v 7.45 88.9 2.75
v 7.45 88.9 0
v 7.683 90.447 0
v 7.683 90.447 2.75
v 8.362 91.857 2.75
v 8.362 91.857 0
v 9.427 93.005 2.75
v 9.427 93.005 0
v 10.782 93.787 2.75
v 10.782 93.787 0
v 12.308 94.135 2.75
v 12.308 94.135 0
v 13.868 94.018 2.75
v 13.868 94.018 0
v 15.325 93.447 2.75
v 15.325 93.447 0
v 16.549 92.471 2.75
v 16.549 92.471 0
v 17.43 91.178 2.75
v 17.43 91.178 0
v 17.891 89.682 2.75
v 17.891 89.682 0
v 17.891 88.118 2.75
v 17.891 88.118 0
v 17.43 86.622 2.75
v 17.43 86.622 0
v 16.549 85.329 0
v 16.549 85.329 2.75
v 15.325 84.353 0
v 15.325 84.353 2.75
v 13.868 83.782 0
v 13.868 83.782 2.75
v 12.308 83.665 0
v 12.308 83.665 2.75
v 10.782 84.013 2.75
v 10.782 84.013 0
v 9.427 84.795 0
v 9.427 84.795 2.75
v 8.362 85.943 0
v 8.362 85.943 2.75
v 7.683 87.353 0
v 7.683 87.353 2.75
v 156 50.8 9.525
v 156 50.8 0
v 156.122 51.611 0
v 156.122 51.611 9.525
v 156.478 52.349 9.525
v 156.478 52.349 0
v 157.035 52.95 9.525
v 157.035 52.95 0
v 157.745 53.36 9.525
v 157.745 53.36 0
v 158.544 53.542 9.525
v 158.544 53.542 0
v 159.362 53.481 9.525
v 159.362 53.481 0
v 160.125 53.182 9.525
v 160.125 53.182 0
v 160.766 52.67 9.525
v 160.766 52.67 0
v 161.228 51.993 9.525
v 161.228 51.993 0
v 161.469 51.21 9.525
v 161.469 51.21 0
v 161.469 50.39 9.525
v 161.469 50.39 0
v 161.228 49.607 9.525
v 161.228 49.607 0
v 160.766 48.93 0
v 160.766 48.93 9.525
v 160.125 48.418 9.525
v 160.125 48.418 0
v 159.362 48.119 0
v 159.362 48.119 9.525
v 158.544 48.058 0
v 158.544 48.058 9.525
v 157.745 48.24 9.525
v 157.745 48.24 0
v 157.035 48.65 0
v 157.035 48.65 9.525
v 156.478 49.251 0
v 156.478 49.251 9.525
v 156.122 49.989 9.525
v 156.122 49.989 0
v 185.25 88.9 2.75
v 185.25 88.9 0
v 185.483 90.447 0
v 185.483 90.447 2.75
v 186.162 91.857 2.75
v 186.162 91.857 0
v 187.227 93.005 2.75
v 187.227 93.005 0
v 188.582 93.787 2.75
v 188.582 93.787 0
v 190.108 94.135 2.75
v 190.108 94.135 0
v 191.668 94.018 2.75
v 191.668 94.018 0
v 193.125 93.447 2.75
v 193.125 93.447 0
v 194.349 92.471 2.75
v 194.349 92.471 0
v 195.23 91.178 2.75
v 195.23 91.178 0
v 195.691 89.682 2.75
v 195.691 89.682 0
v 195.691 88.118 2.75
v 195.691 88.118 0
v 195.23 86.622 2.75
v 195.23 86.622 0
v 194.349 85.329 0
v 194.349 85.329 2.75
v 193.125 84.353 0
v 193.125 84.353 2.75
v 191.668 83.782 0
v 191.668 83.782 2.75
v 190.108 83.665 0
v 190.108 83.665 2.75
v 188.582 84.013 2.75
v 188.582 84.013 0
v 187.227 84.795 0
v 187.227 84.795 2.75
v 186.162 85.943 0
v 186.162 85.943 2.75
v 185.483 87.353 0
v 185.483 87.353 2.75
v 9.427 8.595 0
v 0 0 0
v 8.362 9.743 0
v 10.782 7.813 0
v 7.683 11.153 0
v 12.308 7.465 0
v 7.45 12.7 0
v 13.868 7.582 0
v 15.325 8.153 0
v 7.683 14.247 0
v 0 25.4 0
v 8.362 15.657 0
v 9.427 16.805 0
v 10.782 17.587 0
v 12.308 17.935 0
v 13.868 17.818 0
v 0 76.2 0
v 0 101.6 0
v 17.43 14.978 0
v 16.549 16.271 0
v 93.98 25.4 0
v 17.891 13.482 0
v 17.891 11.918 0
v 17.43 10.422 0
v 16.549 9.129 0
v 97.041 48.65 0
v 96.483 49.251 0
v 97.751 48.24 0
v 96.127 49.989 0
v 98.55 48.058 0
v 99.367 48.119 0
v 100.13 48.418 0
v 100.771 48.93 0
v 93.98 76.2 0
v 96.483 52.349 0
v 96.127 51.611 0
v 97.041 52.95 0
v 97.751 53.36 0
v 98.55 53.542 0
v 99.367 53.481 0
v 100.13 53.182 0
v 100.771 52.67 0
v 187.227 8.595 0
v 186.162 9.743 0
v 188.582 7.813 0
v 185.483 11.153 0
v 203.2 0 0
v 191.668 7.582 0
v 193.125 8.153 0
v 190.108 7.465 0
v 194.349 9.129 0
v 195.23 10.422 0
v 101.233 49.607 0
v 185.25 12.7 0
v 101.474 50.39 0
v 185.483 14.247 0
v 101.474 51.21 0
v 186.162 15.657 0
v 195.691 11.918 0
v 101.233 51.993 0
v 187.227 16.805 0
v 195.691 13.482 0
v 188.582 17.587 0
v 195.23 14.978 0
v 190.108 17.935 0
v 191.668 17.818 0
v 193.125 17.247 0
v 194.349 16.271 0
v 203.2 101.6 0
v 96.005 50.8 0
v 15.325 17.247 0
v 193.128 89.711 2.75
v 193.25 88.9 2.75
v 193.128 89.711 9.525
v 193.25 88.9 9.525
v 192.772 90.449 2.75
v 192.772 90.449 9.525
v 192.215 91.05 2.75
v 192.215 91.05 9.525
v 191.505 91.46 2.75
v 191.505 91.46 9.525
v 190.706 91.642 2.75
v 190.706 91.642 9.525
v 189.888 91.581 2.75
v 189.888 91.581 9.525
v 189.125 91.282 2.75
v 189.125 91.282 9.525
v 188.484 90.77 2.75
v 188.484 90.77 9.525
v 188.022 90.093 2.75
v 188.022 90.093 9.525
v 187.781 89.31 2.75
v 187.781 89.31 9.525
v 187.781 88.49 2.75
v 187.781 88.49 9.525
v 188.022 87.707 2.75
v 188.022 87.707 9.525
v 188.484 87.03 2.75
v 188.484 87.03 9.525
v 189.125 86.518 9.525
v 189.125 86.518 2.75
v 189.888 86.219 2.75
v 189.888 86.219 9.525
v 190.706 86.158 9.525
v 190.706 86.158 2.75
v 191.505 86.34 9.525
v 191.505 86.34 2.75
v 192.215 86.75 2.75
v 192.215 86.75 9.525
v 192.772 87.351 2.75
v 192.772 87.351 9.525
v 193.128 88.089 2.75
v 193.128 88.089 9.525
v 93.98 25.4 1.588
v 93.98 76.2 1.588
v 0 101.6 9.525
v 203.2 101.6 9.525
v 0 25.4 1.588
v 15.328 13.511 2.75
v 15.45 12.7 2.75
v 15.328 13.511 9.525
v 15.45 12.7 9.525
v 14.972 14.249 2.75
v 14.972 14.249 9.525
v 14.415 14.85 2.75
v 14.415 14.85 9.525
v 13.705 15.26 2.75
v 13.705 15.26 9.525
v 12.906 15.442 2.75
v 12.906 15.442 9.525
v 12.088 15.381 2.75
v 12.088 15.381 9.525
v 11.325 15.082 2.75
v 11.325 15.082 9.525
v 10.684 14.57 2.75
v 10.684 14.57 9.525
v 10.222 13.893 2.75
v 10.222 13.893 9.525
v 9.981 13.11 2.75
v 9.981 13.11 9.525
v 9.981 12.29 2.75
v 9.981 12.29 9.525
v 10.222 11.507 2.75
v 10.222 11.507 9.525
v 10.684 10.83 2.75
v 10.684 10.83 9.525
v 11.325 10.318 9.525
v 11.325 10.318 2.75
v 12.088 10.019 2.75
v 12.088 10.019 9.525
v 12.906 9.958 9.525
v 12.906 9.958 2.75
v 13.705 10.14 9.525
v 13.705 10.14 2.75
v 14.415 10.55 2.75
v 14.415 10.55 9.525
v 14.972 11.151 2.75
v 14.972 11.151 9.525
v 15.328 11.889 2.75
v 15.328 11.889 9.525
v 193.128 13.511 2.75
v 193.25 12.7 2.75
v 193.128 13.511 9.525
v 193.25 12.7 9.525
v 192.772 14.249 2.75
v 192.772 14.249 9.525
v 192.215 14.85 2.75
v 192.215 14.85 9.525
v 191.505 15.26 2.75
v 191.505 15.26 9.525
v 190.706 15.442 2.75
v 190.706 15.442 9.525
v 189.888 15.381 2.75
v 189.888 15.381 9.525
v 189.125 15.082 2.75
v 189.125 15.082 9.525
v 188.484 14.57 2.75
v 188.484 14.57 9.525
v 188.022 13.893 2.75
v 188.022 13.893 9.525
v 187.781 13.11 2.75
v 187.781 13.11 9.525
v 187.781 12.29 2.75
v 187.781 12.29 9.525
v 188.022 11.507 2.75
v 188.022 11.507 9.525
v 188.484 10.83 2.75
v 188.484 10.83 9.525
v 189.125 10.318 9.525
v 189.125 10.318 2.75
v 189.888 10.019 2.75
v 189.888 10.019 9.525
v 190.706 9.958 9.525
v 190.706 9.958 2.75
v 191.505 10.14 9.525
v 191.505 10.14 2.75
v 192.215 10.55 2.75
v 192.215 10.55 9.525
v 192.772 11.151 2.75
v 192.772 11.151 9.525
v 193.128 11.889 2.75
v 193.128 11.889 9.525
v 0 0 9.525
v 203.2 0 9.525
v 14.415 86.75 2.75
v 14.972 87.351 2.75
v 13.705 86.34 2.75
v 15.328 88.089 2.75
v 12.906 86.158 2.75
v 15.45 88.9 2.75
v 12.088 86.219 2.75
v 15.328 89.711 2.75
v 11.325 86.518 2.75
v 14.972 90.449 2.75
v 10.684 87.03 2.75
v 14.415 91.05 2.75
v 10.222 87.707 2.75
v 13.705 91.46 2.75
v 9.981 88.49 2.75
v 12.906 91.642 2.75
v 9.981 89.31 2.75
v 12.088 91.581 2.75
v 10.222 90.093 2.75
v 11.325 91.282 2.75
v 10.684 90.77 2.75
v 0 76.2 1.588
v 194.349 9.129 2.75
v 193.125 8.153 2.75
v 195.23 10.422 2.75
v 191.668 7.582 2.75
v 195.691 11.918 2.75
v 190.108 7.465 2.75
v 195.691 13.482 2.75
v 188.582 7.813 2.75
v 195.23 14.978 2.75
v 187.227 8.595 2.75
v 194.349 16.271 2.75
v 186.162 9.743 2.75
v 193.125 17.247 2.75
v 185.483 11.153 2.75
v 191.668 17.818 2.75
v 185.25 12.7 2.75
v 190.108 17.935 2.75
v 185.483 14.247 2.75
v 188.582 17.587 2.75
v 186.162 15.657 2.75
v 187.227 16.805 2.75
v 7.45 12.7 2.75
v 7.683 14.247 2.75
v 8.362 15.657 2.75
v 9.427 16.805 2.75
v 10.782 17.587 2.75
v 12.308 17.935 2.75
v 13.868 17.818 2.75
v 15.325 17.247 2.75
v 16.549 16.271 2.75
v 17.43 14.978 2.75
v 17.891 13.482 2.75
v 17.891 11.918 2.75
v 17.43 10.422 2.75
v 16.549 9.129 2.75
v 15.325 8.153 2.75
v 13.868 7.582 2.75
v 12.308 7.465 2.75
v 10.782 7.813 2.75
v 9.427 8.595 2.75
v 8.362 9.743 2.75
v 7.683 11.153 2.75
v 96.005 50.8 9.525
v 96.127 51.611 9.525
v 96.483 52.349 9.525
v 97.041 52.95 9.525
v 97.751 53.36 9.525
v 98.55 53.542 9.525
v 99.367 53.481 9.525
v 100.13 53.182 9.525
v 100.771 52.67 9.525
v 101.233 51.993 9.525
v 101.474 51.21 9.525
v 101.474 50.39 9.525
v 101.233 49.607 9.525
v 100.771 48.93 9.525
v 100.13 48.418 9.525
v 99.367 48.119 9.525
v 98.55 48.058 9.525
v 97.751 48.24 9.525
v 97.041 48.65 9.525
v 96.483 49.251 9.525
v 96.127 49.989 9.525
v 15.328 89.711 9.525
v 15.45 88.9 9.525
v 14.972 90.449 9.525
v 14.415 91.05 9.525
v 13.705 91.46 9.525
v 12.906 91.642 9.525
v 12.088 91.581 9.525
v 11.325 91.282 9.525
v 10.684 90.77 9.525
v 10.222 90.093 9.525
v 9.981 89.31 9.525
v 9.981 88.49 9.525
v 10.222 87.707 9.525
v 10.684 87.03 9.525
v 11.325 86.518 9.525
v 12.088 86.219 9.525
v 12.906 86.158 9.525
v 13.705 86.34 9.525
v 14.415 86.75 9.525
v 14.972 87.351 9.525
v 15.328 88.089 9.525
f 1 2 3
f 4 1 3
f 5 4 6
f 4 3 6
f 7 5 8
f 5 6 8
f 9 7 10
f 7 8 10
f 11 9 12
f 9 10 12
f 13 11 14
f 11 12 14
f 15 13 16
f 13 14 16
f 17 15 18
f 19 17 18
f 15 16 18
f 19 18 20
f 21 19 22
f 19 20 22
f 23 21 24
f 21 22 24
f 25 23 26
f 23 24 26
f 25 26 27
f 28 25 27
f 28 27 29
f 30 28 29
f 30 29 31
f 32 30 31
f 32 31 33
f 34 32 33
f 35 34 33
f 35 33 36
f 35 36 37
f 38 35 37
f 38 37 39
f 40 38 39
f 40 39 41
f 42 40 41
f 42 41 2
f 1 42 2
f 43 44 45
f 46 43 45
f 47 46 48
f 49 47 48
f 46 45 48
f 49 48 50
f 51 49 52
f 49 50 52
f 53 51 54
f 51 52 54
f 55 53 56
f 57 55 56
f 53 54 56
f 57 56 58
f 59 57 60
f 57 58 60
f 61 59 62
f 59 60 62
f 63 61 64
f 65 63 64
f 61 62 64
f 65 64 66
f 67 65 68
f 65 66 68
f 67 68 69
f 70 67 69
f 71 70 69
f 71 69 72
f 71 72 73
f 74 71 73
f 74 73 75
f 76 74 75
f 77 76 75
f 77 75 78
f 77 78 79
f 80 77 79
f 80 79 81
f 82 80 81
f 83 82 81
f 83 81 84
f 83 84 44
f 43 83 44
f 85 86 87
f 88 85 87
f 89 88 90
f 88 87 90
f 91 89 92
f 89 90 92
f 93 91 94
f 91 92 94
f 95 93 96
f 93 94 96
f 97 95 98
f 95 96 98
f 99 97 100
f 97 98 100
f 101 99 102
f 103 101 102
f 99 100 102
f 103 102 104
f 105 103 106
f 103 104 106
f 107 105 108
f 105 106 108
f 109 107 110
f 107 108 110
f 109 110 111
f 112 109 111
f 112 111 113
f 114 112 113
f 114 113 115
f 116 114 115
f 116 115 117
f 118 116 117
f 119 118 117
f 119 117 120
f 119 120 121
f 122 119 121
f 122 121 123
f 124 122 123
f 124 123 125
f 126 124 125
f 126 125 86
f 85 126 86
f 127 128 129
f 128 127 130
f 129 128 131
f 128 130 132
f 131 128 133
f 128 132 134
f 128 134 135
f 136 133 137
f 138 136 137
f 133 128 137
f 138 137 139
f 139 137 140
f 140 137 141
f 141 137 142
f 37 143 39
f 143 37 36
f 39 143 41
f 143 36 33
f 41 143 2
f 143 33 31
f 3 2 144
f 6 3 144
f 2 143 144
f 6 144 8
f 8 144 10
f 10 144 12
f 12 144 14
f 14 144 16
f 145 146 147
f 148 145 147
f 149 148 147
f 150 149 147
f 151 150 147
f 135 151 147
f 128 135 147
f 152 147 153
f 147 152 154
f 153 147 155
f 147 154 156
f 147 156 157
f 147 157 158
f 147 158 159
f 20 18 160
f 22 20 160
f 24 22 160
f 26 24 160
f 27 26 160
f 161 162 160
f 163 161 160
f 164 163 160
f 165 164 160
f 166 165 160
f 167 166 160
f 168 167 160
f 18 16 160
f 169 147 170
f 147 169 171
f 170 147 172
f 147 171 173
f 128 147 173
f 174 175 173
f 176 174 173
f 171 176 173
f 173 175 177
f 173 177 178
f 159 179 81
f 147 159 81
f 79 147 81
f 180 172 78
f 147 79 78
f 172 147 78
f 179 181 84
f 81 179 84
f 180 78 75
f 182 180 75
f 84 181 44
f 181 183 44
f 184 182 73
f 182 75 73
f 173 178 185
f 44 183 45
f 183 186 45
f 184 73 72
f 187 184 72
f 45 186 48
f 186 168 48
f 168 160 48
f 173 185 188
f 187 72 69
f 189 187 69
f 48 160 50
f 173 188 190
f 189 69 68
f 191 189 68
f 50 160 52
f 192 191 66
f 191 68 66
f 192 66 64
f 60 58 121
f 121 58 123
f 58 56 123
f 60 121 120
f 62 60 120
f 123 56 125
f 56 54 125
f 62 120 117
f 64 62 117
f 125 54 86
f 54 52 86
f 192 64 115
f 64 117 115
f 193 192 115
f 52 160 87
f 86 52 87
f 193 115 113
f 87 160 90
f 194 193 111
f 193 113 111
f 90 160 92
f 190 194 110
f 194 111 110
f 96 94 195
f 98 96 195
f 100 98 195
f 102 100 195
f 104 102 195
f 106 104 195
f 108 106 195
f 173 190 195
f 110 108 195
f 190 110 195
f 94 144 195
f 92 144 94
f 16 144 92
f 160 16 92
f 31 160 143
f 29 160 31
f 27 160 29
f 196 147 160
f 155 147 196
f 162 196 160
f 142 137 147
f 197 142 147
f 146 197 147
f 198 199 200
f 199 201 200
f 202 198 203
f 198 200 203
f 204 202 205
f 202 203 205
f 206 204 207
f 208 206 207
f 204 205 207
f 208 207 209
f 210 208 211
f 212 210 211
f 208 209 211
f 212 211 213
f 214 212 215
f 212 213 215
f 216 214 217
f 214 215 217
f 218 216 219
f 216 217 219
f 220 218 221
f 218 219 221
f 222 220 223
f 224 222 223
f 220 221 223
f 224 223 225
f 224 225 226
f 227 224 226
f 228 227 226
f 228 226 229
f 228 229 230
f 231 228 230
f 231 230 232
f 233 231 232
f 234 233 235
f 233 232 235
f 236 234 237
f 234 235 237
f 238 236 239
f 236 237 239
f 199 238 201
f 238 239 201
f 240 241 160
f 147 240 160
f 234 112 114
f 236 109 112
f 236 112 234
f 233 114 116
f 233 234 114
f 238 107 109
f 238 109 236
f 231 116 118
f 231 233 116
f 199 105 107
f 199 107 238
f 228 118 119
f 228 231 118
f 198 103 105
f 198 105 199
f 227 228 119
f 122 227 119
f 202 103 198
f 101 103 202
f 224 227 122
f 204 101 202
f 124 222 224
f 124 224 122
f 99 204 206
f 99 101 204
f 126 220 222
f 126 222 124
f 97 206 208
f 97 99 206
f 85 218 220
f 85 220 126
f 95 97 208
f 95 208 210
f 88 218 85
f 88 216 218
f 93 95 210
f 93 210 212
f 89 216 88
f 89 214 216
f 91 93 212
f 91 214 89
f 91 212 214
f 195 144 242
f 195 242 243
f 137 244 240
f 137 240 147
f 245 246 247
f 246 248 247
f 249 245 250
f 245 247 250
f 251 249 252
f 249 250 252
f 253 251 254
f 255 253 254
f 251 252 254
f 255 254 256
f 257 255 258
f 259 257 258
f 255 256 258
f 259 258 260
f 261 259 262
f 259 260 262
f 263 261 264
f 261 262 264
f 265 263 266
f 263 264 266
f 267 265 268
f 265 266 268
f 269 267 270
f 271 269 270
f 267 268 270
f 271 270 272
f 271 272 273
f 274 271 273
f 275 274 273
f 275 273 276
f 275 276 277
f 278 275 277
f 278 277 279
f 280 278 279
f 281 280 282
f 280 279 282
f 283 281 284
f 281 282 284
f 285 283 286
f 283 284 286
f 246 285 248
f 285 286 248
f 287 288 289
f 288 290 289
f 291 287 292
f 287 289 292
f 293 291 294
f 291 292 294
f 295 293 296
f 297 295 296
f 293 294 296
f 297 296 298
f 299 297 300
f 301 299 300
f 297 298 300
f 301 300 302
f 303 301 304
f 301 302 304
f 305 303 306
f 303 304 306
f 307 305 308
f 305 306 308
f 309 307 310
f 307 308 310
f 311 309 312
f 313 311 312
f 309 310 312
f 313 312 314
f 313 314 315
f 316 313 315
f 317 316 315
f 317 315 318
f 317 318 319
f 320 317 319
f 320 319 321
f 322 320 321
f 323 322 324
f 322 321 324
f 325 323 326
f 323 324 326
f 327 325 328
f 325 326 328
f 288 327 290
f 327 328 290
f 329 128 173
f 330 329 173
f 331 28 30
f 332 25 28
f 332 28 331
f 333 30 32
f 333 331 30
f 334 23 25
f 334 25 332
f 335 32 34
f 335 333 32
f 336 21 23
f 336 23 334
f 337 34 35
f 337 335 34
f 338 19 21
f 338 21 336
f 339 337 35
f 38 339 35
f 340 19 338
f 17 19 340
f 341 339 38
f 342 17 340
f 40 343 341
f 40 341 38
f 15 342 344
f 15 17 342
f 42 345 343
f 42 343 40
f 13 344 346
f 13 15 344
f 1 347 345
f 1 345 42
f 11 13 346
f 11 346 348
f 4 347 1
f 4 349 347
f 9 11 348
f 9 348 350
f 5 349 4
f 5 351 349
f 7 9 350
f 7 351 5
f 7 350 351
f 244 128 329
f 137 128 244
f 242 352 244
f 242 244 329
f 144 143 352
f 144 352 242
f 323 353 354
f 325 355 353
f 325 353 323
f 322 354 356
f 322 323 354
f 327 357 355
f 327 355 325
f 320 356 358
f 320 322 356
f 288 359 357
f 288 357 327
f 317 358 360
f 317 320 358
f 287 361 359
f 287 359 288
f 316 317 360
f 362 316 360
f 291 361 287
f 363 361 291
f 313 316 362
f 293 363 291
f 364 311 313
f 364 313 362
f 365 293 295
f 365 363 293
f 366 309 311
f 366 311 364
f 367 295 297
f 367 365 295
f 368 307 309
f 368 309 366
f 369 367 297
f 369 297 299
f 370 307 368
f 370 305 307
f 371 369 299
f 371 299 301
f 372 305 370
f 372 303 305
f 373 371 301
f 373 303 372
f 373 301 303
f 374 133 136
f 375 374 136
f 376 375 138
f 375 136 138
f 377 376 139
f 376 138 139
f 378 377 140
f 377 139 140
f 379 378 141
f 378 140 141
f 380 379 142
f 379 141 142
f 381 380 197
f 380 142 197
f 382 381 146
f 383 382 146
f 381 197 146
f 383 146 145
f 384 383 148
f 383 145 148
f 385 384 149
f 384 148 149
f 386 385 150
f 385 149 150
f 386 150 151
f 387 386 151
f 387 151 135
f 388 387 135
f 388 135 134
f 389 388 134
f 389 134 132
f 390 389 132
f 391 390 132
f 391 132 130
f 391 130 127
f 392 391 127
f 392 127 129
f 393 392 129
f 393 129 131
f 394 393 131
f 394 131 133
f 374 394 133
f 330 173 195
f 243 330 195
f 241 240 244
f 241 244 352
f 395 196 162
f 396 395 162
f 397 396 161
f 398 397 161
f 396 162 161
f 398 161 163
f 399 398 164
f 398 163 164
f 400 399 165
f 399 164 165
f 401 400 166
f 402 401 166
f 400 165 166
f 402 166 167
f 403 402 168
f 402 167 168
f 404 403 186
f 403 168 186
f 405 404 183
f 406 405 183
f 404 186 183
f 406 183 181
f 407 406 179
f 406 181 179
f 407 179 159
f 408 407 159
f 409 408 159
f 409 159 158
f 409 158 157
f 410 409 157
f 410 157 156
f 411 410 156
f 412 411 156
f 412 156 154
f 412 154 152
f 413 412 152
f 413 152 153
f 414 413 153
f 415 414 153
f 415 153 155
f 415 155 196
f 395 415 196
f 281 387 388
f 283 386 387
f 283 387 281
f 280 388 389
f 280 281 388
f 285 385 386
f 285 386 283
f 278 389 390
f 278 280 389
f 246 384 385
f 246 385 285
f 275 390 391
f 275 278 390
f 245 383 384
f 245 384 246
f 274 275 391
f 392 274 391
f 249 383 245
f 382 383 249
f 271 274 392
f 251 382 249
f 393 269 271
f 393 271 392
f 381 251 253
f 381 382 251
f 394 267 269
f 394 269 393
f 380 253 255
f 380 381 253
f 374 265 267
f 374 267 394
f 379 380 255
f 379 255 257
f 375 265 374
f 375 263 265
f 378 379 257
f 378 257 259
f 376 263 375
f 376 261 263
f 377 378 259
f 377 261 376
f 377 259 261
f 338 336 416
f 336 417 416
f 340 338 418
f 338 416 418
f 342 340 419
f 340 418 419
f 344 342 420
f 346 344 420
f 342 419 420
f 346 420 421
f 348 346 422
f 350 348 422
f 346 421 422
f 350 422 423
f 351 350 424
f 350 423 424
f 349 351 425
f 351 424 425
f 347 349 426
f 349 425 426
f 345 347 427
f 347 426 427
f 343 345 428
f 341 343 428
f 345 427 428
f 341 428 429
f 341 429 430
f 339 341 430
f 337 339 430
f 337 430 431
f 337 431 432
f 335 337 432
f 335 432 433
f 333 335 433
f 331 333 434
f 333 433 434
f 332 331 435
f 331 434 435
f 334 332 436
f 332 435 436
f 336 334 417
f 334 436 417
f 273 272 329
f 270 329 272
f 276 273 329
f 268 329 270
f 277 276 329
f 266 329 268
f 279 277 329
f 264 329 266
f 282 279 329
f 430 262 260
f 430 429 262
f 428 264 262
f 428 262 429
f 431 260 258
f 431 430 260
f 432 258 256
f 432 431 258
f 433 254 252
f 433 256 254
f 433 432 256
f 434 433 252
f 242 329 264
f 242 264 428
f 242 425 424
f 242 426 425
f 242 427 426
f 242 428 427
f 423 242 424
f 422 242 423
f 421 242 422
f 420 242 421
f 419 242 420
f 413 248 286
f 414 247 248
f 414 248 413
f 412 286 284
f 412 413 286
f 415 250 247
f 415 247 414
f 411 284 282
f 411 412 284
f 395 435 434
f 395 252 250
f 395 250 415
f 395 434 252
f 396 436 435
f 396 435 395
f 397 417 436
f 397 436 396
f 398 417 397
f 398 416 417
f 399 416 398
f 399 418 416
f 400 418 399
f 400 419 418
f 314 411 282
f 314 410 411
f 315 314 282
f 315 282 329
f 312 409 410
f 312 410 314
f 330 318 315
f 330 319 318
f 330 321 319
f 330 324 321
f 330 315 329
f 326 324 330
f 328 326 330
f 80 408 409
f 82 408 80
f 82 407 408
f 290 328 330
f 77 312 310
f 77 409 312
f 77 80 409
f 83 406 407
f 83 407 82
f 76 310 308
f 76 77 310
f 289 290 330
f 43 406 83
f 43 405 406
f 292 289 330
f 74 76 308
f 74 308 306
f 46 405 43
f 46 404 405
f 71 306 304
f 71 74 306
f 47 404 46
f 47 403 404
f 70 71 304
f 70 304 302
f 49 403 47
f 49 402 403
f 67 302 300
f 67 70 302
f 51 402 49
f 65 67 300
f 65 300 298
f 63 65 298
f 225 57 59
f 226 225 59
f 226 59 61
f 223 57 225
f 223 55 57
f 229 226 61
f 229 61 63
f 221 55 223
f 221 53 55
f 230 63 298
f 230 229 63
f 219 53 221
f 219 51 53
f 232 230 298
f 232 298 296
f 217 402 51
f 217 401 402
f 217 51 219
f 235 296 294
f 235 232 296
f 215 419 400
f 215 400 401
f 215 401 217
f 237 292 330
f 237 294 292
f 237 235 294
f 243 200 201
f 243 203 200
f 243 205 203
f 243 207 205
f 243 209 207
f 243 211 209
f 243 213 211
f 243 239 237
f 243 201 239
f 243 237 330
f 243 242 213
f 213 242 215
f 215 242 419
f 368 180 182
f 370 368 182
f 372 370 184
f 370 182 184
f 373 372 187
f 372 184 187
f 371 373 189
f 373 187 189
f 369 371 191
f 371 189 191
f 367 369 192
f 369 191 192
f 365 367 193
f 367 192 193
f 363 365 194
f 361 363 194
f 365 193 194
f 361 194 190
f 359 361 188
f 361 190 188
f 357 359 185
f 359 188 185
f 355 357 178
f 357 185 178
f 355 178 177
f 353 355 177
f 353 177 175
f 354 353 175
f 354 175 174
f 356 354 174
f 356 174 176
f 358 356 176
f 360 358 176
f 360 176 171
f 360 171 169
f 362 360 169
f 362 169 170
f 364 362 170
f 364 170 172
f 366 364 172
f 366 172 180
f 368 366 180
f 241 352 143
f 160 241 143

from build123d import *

# Parameters (mm, degrees)
SKETCH1_W                       = 203.2
SKETCH1_H                       = 101.6
BOSS_EXTRUDE1_DEPTH             = 9.525
CUT_EXTRUDE1_DEPTH              = 93.98
CUT_EXTRUDE1_DEPTH_BACK         = 228.384092726
SKETCH2_W                       = 1.5875
SKETCH2_H                       = 50.8
CBORE_FOR_M5_SBHCS1_D           = 5.5
CBORE_FOR_M5_SBHCS1_CBORE_D     = 10.5
CBORE_FOR_M5_SBHCS1_CBORE_DEPTH = 2.75
M5_CLEARANCE_HOLE1_D            = 5.5


with BuildPart() as part:
    # Sketch1 → Boss-Extrude1 (new body)
    with BuildSketch(Plane.XY):
        with Locations((101.6, 50.8)):
            Rectangle(SKETCH1_W, SKETCH1_H)
    extrude(amount=BOSS_EXTRUDE1_DEPTH)

    # Sketch2 → Cut-Extrude1 (cut, two sides: drawn at the far end of the back side and taken through both)
    with BuildSketch(Plane(origin=(0, 0, 0), x_dir=(0, 0, -1), z_dir=(1, 0, 0)).offset(-CUT_EXTRUDE1_DEPTH_BACK)):
        with Locations((-0.79375, 50.8)):
            Rectangle(SKETCH2_W, SKETCH2_H)
    extrude(amount=CUT_EXTRUDE1_DEPTH + CUT_EXTRUDE1_DEPTH_BACK, mode=Mode.SUBTRACT)

    # CBORE for M5 SBHCS1 (through all)
    with Locations(Plane(origin=(0, 0, 0), x_dir=(-1, 0, 0), z_dir=(0, 0, -1))):
        with Locations((-190.5, 88.9), (-12.7, 88.9), (-12.7, 12.7), (-190.5, 12.7)):
            CounterBoreHole(CBORE_FOR_M5_SBHCS1_D / 2, CBORE_FOR_M5_SBHCS1_CBORE_D / 2, CBORE_FOR_M5_SBHCS1_CBORE_DEPTH)

    # M5 Clearance Hole1 (through all)
    with Locations(Plane.XY.offset(9.525)):
        with Locations((158.75, 50.8), (98.7552, 50.8)):
            Hole(M5_CLEARANCE_HOLE1_D / 2)


solid = part.part
